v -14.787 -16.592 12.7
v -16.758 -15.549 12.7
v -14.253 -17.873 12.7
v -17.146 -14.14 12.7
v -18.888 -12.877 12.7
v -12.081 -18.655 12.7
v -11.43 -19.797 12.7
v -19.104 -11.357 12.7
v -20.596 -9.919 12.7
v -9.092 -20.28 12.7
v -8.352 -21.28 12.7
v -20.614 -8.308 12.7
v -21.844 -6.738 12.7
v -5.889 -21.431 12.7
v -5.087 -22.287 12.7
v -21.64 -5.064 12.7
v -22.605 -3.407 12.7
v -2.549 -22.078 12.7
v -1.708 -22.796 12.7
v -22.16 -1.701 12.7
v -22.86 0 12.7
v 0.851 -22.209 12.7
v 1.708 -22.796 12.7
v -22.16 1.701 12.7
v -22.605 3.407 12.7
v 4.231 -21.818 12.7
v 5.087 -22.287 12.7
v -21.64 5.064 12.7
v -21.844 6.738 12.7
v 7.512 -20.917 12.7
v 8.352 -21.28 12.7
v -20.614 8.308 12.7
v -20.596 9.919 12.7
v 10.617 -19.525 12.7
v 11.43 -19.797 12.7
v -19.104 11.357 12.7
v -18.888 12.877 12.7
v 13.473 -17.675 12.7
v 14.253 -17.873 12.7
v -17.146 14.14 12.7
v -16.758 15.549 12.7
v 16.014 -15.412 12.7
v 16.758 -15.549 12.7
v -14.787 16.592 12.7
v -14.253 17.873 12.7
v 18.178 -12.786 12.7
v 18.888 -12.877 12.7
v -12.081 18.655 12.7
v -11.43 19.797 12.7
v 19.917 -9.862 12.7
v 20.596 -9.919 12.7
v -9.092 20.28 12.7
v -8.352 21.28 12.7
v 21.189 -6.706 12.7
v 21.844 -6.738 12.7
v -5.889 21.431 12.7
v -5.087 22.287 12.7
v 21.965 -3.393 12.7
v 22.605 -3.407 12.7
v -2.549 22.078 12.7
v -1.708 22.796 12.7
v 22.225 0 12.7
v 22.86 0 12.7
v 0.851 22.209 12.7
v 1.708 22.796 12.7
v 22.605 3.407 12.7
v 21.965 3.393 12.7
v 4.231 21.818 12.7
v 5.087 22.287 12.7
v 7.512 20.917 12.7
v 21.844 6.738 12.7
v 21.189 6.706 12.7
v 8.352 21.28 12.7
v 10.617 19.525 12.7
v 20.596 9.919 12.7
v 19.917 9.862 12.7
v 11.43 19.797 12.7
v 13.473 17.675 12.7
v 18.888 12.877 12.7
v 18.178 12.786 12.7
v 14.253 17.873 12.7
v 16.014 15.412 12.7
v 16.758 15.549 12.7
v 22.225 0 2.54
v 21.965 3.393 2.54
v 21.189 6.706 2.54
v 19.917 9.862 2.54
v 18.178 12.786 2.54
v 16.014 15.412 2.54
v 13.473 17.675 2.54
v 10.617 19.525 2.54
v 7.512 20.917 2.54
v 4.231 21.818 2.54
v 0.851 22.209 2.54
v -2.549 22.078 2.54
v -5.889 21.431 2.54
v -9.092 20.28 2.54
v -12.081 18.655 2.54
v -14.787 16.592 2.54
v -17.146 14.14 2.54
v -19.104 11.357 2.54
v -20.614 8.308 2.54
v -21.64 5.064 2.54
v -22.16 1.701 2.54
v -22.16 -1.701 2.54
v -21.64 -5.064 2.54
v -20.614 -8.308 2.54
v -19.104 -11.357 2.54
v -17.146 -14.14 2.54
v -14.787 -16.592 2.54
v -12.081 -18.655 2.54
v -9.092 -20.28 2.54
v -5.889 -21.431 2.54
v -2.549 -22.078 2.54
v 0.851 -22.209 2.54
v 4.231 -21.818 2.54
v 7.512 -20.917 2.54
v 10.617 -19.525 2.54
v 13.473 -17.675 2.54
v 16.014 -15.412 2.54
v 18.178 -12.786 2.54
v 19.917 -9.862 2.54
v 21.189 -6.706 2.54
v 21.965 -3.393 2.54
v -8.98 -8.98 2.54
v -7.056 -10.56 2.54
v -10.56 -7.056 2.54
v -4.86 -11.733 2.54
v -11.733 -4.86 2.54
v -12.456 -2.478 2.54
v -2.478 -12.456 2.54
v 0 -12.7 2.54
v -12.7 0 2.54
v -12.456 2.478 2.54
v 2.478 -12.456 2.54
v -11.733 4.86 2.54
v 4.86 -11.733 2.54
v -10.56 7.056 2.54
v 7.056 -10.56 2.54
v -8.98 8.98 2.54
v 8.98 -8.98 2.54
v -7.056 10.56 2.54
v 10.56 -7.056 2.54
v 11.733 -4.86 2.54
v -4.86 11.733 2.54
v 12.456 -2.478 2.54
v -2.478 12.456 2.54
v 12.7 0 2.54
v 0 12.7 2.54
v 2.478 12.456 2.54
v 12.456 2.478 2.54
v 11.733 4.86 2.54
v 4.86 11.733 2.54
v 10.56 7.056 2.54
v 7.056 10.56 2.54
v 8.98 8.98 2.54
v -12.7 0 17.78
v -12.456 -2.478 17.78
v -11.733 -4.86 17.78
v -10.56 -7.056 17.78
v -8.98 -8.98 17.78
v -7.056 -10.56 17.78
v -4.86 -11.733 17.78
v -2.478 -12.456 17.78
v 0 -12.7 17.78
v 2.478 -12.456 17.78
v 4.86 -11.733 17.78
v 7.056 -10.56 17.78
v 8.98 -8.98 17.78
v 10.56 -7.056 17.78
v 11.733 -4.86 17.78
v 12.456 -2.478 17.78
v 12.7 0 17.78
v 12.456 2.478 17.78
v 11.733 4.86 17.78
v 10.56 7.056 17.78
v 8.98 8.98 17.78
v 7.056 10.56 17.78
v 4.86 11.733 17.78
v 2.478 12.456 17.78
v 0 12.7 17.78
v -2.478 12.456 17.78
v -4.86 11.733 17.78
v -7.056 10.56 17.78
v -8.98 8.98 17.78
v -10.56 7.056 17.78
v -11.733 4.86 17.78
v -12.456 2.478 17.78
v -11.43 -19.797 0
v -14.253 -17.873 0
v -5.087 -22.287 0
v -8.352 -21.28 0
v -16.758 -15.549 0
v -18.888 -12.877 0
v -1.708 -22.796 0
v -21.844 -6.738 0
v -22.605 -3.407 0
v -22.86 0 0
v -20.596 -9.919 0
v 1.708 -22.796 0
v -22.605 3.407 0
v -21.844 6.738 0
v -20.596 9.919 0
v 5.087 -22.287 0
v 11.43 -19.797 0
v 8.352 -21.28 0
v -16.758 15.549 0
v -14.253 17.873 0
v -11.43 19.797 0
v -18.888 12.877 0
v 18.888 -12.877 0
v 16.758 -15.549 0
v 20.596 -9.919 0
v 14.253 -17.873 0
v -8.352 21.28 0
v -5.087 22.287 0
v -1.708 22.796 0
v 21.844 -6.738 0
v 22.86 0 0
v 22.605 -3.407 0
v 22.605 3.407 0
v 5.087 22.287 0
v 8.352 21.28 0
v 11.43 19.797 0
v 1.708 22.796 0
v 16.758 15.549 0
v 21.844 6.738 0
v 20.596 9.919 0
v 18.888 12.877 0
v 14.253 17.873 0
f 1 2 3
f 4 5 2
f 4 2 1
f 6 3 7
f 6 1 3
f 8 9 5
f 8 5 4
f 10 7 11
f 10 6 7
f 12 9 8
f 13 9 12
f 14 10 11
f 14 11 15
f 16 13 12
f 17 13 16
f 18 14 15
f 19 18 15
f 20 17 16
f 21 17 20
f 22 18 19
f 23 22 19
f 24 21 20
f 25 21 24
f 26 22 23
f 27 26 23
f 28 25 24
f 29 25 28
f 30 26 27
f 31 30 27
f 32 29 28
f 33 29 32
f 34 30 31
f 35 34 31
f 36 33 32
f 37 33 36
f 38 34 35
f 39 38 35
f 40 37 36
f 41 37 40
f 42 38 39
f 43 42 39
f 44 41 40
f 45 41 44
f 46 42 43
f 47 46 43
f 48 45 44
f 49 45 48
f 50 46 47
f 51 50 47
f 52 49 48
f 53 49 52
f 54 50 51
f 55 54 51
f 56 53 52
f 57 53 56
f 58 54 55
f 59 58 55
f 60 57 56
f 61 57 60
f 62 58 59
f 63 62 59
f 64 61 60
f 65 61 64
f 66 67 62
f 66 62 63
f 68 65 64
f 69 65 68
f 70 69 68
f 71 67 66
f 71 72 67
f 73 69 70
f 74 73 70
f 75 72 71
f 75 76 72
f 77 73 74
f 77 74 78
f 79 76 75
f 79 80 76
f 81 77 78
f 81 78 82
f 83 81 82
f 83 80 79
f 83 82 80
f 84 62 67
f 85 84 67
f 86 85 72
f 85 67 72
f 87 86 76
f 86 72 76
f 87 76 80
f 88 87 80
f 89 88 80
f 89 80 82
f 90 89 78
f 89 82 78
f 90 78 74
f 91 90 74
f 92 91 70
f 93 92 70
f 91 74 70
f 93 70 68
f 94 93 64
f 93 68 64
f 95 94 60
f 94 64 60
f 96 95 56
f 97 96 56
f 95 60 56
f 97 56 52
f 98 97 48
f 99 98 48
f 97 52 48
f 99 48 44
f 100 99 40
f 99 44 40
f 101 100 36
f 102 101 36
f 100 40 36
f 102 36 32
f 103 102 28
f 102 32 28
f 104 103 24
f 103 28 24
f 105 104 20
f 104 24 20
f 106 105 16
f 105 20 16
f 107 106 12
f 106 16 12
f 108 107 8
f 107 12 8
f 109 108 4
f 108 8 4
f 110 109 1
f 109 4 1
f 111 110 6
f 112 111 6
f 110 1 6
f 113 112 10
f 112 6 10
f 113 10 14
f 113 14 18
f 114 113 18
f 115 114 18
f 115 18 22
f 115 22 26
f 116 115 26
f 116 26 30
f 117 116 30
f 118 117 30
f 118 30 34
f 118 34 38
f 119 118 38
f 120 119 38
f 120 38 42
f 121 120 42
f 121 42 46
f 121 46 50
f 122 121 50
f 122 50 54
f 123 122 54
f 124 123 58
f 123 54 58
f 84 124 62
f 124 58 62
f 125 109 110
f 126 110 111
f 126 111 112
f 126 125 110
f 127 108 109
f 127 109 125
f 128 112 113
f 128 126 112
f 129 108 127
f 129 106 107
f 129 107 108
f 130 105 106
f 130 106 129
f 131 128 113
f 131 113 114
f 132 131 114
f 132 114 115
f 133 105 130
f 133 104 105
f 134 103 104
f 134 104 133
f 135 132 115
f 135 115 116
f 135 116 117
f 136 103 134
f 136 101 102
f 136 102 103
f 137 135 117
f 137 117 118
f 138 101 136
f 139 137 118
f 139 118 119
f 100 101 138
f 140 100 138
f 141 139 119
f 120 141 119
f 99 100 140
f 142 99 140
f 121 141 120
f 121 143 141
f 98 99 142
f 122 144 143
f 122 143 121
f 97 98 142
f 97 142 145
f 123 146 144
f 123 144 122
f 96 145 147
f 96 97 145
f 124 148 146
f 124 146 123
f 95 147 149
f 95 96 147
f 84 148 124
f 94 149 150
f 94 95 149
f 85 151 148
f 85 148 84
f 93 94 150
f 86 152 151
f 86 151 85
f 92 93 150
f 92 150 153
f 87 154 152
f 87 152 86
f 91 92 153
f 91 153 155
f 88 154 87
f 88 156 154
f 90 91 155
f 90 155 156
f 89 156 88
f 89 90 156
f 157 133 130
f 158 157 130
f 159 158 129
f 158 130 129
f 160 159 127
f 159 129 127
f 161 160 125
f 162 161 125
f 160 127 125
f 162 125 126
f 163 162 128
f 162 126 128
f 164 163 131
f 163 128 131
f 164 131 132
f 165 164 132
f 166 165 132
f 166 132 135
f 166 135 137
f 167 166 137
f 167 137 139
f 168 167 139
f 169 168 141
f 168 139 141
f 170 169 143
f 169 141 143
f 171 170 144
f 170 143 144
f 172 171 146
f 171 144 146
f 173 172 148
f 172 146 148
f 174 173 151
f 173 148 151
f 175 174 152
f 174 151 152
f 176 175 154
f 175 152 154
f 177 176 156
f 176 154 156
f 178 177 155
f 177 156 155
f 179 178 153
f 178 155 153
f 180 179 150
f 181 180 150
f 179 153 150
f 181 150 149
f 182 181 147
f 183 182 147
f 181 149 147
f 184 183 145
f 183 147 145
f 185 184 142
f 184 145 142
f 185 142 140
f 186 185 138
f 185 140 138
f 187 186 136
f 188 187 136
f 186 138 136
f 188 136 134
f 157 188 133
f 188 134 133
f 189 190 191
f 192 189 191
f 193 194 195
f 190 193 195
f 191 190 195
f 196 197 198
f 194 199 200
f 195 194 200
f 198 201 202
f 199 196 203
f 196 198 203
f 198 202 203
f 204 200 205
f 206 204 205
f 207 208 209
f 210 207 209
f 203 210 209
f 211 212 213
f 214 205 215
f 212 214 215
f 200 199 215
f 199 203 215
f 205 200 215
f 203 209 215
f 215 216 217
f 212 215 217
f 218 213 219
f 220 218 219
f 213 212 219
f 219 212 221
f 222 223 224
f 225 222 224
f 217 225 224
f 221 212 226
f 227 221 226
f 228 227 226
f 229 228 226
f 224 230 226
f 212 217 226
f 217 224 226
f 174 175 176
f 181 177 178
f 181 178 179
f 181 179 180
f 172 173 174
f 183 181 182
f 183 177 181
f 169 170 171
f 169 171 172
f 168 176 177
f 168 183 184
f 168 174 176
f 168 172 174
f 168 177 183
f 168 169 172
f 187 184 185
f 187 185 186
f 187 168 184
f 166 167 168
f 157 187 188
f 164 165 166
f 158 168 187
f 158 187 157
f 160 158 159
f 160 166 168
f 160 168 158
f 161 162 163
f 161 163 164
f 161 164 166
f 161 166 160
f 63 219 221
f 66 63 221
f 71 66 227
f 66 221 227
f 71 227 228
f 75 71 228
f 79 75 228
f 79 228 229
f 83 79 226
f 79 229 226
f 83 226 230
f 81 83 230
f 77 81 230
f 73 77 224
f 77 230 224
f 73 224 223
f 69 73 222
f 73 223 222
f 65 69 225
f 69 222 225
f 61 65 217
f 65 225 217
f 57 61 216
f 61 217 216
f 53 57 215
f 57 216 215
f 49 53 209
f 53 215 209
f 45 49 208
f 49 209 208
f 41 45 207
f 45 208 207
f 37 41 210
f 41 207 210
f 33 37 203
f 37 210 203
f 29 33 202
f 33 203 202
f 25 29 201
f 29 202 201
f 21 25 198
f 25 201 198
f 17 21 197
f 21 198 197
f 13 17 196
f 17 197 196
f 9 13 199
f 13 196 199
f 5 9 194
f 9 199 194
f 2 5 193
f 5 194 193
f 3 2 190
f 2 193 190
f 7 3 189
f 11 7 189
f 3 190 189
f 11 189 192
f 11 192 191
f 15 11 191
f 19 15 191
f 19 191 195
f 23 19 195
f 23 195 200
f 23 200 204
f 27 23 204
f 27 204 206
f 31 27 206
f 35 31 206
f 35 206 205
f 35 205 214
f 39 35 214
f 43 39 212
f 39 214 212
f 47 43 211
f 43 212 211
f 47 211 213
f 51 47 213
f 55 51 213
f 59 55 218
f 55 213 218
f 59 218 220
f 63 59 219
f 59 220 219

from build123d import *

# Parameters (mm, degrees)
SKETCH1_R           = 22.86
BOSS_EXTRUDE1_DEPTH = 12.7
SKETCH2_R           = 22.225
CUT_EXTRUDE1_DEPTH  = 10.16
SKETCH3_R           = 12.7
BOSS_EXTRUDE2_DEPTH = 15.24


with BuildPart() as part:
    # Sketch1 → Boss-Extrude1 (new body)
    with BuildSketch(Plane.XY):
        Circle(SKETCH1_R)
    extrude(amount=BOSS_EXTRUDE1_DEPTH)

    # Sketch2 → Cut-Extrude1 (cut)
    with BuildSketch(Plane.XY.offset(12.7)):
        Circle(SKETCH2_R)
    extrude(amount=-CUT_EXTRUDE1_DEPTH, mode=Mode.SUBTRACT)

    # Sketch3 → Boss-Extrude2 (add)
    with BuildSketch(Plane.XY.offset(2.54)):
        with Locations(Location((0, 0, 0), (0, 0, 180))):
            Circle(SKETCH3_R)
    extrude(amount=BOSS_EXTRUDE2_DEPTH)


solid = part.part
